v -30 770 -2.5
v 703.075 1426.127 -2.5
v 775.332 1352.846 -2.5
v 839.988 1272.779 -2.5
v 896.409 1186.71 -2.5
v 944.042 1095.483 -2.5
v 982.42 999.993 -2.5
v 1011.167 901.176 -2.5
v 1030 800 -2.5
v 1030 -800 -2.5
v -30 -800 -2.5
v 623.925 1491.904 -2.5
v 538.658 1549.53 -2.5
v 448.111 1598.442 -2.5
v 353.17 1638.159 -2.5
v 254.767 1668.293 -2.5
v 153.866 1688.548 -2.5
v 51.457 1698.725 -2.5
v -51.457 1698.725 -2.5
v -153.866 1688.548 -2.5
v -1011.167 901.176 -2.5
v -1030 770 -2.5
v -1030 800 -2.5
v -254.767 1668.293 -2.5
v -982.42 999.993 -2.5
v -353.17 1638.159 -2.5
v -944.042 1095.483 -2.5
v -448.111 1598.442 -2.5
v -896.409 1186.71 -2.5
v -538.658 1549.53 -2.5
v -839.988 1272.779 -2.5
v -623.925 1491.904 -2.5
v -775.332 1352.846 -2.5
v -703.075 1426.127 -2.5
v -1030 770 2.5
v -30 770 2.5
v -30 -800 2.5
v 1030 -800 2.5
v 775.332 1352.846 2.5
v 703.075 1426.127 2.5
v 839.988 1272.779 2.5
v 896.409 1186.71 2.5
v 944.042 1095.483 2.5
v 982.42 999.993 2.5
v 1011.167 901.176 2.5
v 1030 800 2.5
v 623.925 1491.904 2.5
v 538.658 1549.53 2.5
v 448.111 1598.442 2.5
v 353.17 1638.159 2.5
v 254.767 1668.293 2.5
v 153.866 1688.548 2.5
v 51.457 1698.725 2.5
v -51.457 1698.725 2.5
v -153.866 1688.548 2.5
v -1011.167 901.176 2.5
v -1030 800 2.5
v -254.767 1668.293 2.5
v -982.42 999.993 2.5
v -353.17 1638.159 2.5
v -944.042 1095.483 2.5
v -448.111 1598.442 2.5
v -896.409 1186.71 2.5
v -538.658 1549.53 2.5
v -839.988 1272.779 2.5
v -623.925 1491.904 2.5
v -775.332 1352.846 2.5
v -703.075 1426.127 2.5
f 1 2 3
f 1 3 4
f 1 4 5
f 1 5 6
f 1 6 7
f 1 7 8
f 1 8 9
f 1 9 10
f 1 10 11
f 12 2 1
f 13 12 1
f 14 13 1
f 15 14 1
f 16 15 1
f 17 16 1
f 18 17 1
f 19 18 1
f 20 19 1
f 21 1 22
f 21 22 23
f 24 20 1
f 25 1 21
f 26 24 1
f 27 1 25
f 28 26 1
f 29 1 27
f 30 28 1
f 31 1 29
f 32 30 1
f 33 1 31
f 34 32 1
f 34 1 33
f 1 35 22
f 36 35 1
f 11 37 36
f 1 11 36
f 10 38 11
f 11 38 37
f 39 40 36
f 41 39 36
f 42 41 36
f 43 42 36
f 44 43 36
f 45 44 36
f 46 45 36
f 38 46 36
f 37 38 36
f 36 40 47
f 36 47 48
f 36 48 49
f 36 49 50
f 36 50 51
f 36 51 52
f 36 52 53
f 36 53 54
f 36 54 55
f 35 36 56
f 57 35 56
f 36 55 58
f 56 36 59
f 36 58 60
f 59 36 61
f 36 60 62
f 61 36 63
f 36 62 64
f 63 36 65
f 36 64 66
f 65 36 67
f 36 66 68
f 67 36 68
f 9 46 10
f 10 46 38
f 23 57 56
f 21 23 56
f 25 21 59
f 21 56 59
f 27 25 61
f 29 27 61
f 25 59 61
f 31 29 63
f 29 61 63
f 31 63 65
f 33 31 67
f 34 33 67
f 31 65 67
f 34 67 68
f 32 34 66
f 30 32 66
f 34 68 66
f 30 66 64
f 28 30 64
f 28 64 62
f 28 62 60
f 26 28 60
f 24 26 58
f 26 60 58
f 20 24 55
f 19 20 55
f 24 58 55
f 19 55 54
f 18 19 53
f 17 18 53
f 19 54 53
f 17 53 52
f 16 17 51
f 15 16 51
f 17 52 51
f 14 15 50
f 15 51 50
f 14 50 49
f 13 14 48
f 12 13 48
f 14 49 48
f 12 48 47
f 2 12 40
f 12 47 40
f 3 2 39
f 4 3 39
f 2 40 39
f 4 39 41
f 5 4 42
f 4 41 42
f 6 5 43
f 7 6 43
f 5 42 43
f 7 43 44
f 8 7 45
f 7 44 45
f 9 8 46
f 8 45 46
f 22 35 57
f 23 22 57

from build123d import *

# Parameters (mm, degrees)
BOSS_EXTRUDE1_DEPTH = 2.5
SKETCH2_W           = 1000
SKETCH2_H           = 1570
CUT_EXTRUDE2_DEPTH  = 6


with BuildPart() as part:
    # Sketch1 → Boss-Extrude1 (new body, symmetric)
    with BuildSketch(Plane.XY):
        with BuildLine():
            Line((1030, 800), (1030, -800))
            Line((1030, -800), (-1030, -800))
            Line((-1030, -800), (-1030, 800))
            ThreePointArc((-1030, 800), (0, 1700), (1030, 800))
        make_face()
    extrude(amount=BOSS_EXTRUDE1_DEPTH, both=True)

    # Sketch2 → Cut-Extrude2 (cut, through all)
    with BuildSketch(Plane.XY.offset(2.5)):
        with Locations((-530, -15)):
            Rectangle(SKETCH2_W, SKETCH2_H)
    extrude(amount=-CUT_EXTRUDE2_DEPTH, mode=Mode.SUBTRACT)


solid = part.part
